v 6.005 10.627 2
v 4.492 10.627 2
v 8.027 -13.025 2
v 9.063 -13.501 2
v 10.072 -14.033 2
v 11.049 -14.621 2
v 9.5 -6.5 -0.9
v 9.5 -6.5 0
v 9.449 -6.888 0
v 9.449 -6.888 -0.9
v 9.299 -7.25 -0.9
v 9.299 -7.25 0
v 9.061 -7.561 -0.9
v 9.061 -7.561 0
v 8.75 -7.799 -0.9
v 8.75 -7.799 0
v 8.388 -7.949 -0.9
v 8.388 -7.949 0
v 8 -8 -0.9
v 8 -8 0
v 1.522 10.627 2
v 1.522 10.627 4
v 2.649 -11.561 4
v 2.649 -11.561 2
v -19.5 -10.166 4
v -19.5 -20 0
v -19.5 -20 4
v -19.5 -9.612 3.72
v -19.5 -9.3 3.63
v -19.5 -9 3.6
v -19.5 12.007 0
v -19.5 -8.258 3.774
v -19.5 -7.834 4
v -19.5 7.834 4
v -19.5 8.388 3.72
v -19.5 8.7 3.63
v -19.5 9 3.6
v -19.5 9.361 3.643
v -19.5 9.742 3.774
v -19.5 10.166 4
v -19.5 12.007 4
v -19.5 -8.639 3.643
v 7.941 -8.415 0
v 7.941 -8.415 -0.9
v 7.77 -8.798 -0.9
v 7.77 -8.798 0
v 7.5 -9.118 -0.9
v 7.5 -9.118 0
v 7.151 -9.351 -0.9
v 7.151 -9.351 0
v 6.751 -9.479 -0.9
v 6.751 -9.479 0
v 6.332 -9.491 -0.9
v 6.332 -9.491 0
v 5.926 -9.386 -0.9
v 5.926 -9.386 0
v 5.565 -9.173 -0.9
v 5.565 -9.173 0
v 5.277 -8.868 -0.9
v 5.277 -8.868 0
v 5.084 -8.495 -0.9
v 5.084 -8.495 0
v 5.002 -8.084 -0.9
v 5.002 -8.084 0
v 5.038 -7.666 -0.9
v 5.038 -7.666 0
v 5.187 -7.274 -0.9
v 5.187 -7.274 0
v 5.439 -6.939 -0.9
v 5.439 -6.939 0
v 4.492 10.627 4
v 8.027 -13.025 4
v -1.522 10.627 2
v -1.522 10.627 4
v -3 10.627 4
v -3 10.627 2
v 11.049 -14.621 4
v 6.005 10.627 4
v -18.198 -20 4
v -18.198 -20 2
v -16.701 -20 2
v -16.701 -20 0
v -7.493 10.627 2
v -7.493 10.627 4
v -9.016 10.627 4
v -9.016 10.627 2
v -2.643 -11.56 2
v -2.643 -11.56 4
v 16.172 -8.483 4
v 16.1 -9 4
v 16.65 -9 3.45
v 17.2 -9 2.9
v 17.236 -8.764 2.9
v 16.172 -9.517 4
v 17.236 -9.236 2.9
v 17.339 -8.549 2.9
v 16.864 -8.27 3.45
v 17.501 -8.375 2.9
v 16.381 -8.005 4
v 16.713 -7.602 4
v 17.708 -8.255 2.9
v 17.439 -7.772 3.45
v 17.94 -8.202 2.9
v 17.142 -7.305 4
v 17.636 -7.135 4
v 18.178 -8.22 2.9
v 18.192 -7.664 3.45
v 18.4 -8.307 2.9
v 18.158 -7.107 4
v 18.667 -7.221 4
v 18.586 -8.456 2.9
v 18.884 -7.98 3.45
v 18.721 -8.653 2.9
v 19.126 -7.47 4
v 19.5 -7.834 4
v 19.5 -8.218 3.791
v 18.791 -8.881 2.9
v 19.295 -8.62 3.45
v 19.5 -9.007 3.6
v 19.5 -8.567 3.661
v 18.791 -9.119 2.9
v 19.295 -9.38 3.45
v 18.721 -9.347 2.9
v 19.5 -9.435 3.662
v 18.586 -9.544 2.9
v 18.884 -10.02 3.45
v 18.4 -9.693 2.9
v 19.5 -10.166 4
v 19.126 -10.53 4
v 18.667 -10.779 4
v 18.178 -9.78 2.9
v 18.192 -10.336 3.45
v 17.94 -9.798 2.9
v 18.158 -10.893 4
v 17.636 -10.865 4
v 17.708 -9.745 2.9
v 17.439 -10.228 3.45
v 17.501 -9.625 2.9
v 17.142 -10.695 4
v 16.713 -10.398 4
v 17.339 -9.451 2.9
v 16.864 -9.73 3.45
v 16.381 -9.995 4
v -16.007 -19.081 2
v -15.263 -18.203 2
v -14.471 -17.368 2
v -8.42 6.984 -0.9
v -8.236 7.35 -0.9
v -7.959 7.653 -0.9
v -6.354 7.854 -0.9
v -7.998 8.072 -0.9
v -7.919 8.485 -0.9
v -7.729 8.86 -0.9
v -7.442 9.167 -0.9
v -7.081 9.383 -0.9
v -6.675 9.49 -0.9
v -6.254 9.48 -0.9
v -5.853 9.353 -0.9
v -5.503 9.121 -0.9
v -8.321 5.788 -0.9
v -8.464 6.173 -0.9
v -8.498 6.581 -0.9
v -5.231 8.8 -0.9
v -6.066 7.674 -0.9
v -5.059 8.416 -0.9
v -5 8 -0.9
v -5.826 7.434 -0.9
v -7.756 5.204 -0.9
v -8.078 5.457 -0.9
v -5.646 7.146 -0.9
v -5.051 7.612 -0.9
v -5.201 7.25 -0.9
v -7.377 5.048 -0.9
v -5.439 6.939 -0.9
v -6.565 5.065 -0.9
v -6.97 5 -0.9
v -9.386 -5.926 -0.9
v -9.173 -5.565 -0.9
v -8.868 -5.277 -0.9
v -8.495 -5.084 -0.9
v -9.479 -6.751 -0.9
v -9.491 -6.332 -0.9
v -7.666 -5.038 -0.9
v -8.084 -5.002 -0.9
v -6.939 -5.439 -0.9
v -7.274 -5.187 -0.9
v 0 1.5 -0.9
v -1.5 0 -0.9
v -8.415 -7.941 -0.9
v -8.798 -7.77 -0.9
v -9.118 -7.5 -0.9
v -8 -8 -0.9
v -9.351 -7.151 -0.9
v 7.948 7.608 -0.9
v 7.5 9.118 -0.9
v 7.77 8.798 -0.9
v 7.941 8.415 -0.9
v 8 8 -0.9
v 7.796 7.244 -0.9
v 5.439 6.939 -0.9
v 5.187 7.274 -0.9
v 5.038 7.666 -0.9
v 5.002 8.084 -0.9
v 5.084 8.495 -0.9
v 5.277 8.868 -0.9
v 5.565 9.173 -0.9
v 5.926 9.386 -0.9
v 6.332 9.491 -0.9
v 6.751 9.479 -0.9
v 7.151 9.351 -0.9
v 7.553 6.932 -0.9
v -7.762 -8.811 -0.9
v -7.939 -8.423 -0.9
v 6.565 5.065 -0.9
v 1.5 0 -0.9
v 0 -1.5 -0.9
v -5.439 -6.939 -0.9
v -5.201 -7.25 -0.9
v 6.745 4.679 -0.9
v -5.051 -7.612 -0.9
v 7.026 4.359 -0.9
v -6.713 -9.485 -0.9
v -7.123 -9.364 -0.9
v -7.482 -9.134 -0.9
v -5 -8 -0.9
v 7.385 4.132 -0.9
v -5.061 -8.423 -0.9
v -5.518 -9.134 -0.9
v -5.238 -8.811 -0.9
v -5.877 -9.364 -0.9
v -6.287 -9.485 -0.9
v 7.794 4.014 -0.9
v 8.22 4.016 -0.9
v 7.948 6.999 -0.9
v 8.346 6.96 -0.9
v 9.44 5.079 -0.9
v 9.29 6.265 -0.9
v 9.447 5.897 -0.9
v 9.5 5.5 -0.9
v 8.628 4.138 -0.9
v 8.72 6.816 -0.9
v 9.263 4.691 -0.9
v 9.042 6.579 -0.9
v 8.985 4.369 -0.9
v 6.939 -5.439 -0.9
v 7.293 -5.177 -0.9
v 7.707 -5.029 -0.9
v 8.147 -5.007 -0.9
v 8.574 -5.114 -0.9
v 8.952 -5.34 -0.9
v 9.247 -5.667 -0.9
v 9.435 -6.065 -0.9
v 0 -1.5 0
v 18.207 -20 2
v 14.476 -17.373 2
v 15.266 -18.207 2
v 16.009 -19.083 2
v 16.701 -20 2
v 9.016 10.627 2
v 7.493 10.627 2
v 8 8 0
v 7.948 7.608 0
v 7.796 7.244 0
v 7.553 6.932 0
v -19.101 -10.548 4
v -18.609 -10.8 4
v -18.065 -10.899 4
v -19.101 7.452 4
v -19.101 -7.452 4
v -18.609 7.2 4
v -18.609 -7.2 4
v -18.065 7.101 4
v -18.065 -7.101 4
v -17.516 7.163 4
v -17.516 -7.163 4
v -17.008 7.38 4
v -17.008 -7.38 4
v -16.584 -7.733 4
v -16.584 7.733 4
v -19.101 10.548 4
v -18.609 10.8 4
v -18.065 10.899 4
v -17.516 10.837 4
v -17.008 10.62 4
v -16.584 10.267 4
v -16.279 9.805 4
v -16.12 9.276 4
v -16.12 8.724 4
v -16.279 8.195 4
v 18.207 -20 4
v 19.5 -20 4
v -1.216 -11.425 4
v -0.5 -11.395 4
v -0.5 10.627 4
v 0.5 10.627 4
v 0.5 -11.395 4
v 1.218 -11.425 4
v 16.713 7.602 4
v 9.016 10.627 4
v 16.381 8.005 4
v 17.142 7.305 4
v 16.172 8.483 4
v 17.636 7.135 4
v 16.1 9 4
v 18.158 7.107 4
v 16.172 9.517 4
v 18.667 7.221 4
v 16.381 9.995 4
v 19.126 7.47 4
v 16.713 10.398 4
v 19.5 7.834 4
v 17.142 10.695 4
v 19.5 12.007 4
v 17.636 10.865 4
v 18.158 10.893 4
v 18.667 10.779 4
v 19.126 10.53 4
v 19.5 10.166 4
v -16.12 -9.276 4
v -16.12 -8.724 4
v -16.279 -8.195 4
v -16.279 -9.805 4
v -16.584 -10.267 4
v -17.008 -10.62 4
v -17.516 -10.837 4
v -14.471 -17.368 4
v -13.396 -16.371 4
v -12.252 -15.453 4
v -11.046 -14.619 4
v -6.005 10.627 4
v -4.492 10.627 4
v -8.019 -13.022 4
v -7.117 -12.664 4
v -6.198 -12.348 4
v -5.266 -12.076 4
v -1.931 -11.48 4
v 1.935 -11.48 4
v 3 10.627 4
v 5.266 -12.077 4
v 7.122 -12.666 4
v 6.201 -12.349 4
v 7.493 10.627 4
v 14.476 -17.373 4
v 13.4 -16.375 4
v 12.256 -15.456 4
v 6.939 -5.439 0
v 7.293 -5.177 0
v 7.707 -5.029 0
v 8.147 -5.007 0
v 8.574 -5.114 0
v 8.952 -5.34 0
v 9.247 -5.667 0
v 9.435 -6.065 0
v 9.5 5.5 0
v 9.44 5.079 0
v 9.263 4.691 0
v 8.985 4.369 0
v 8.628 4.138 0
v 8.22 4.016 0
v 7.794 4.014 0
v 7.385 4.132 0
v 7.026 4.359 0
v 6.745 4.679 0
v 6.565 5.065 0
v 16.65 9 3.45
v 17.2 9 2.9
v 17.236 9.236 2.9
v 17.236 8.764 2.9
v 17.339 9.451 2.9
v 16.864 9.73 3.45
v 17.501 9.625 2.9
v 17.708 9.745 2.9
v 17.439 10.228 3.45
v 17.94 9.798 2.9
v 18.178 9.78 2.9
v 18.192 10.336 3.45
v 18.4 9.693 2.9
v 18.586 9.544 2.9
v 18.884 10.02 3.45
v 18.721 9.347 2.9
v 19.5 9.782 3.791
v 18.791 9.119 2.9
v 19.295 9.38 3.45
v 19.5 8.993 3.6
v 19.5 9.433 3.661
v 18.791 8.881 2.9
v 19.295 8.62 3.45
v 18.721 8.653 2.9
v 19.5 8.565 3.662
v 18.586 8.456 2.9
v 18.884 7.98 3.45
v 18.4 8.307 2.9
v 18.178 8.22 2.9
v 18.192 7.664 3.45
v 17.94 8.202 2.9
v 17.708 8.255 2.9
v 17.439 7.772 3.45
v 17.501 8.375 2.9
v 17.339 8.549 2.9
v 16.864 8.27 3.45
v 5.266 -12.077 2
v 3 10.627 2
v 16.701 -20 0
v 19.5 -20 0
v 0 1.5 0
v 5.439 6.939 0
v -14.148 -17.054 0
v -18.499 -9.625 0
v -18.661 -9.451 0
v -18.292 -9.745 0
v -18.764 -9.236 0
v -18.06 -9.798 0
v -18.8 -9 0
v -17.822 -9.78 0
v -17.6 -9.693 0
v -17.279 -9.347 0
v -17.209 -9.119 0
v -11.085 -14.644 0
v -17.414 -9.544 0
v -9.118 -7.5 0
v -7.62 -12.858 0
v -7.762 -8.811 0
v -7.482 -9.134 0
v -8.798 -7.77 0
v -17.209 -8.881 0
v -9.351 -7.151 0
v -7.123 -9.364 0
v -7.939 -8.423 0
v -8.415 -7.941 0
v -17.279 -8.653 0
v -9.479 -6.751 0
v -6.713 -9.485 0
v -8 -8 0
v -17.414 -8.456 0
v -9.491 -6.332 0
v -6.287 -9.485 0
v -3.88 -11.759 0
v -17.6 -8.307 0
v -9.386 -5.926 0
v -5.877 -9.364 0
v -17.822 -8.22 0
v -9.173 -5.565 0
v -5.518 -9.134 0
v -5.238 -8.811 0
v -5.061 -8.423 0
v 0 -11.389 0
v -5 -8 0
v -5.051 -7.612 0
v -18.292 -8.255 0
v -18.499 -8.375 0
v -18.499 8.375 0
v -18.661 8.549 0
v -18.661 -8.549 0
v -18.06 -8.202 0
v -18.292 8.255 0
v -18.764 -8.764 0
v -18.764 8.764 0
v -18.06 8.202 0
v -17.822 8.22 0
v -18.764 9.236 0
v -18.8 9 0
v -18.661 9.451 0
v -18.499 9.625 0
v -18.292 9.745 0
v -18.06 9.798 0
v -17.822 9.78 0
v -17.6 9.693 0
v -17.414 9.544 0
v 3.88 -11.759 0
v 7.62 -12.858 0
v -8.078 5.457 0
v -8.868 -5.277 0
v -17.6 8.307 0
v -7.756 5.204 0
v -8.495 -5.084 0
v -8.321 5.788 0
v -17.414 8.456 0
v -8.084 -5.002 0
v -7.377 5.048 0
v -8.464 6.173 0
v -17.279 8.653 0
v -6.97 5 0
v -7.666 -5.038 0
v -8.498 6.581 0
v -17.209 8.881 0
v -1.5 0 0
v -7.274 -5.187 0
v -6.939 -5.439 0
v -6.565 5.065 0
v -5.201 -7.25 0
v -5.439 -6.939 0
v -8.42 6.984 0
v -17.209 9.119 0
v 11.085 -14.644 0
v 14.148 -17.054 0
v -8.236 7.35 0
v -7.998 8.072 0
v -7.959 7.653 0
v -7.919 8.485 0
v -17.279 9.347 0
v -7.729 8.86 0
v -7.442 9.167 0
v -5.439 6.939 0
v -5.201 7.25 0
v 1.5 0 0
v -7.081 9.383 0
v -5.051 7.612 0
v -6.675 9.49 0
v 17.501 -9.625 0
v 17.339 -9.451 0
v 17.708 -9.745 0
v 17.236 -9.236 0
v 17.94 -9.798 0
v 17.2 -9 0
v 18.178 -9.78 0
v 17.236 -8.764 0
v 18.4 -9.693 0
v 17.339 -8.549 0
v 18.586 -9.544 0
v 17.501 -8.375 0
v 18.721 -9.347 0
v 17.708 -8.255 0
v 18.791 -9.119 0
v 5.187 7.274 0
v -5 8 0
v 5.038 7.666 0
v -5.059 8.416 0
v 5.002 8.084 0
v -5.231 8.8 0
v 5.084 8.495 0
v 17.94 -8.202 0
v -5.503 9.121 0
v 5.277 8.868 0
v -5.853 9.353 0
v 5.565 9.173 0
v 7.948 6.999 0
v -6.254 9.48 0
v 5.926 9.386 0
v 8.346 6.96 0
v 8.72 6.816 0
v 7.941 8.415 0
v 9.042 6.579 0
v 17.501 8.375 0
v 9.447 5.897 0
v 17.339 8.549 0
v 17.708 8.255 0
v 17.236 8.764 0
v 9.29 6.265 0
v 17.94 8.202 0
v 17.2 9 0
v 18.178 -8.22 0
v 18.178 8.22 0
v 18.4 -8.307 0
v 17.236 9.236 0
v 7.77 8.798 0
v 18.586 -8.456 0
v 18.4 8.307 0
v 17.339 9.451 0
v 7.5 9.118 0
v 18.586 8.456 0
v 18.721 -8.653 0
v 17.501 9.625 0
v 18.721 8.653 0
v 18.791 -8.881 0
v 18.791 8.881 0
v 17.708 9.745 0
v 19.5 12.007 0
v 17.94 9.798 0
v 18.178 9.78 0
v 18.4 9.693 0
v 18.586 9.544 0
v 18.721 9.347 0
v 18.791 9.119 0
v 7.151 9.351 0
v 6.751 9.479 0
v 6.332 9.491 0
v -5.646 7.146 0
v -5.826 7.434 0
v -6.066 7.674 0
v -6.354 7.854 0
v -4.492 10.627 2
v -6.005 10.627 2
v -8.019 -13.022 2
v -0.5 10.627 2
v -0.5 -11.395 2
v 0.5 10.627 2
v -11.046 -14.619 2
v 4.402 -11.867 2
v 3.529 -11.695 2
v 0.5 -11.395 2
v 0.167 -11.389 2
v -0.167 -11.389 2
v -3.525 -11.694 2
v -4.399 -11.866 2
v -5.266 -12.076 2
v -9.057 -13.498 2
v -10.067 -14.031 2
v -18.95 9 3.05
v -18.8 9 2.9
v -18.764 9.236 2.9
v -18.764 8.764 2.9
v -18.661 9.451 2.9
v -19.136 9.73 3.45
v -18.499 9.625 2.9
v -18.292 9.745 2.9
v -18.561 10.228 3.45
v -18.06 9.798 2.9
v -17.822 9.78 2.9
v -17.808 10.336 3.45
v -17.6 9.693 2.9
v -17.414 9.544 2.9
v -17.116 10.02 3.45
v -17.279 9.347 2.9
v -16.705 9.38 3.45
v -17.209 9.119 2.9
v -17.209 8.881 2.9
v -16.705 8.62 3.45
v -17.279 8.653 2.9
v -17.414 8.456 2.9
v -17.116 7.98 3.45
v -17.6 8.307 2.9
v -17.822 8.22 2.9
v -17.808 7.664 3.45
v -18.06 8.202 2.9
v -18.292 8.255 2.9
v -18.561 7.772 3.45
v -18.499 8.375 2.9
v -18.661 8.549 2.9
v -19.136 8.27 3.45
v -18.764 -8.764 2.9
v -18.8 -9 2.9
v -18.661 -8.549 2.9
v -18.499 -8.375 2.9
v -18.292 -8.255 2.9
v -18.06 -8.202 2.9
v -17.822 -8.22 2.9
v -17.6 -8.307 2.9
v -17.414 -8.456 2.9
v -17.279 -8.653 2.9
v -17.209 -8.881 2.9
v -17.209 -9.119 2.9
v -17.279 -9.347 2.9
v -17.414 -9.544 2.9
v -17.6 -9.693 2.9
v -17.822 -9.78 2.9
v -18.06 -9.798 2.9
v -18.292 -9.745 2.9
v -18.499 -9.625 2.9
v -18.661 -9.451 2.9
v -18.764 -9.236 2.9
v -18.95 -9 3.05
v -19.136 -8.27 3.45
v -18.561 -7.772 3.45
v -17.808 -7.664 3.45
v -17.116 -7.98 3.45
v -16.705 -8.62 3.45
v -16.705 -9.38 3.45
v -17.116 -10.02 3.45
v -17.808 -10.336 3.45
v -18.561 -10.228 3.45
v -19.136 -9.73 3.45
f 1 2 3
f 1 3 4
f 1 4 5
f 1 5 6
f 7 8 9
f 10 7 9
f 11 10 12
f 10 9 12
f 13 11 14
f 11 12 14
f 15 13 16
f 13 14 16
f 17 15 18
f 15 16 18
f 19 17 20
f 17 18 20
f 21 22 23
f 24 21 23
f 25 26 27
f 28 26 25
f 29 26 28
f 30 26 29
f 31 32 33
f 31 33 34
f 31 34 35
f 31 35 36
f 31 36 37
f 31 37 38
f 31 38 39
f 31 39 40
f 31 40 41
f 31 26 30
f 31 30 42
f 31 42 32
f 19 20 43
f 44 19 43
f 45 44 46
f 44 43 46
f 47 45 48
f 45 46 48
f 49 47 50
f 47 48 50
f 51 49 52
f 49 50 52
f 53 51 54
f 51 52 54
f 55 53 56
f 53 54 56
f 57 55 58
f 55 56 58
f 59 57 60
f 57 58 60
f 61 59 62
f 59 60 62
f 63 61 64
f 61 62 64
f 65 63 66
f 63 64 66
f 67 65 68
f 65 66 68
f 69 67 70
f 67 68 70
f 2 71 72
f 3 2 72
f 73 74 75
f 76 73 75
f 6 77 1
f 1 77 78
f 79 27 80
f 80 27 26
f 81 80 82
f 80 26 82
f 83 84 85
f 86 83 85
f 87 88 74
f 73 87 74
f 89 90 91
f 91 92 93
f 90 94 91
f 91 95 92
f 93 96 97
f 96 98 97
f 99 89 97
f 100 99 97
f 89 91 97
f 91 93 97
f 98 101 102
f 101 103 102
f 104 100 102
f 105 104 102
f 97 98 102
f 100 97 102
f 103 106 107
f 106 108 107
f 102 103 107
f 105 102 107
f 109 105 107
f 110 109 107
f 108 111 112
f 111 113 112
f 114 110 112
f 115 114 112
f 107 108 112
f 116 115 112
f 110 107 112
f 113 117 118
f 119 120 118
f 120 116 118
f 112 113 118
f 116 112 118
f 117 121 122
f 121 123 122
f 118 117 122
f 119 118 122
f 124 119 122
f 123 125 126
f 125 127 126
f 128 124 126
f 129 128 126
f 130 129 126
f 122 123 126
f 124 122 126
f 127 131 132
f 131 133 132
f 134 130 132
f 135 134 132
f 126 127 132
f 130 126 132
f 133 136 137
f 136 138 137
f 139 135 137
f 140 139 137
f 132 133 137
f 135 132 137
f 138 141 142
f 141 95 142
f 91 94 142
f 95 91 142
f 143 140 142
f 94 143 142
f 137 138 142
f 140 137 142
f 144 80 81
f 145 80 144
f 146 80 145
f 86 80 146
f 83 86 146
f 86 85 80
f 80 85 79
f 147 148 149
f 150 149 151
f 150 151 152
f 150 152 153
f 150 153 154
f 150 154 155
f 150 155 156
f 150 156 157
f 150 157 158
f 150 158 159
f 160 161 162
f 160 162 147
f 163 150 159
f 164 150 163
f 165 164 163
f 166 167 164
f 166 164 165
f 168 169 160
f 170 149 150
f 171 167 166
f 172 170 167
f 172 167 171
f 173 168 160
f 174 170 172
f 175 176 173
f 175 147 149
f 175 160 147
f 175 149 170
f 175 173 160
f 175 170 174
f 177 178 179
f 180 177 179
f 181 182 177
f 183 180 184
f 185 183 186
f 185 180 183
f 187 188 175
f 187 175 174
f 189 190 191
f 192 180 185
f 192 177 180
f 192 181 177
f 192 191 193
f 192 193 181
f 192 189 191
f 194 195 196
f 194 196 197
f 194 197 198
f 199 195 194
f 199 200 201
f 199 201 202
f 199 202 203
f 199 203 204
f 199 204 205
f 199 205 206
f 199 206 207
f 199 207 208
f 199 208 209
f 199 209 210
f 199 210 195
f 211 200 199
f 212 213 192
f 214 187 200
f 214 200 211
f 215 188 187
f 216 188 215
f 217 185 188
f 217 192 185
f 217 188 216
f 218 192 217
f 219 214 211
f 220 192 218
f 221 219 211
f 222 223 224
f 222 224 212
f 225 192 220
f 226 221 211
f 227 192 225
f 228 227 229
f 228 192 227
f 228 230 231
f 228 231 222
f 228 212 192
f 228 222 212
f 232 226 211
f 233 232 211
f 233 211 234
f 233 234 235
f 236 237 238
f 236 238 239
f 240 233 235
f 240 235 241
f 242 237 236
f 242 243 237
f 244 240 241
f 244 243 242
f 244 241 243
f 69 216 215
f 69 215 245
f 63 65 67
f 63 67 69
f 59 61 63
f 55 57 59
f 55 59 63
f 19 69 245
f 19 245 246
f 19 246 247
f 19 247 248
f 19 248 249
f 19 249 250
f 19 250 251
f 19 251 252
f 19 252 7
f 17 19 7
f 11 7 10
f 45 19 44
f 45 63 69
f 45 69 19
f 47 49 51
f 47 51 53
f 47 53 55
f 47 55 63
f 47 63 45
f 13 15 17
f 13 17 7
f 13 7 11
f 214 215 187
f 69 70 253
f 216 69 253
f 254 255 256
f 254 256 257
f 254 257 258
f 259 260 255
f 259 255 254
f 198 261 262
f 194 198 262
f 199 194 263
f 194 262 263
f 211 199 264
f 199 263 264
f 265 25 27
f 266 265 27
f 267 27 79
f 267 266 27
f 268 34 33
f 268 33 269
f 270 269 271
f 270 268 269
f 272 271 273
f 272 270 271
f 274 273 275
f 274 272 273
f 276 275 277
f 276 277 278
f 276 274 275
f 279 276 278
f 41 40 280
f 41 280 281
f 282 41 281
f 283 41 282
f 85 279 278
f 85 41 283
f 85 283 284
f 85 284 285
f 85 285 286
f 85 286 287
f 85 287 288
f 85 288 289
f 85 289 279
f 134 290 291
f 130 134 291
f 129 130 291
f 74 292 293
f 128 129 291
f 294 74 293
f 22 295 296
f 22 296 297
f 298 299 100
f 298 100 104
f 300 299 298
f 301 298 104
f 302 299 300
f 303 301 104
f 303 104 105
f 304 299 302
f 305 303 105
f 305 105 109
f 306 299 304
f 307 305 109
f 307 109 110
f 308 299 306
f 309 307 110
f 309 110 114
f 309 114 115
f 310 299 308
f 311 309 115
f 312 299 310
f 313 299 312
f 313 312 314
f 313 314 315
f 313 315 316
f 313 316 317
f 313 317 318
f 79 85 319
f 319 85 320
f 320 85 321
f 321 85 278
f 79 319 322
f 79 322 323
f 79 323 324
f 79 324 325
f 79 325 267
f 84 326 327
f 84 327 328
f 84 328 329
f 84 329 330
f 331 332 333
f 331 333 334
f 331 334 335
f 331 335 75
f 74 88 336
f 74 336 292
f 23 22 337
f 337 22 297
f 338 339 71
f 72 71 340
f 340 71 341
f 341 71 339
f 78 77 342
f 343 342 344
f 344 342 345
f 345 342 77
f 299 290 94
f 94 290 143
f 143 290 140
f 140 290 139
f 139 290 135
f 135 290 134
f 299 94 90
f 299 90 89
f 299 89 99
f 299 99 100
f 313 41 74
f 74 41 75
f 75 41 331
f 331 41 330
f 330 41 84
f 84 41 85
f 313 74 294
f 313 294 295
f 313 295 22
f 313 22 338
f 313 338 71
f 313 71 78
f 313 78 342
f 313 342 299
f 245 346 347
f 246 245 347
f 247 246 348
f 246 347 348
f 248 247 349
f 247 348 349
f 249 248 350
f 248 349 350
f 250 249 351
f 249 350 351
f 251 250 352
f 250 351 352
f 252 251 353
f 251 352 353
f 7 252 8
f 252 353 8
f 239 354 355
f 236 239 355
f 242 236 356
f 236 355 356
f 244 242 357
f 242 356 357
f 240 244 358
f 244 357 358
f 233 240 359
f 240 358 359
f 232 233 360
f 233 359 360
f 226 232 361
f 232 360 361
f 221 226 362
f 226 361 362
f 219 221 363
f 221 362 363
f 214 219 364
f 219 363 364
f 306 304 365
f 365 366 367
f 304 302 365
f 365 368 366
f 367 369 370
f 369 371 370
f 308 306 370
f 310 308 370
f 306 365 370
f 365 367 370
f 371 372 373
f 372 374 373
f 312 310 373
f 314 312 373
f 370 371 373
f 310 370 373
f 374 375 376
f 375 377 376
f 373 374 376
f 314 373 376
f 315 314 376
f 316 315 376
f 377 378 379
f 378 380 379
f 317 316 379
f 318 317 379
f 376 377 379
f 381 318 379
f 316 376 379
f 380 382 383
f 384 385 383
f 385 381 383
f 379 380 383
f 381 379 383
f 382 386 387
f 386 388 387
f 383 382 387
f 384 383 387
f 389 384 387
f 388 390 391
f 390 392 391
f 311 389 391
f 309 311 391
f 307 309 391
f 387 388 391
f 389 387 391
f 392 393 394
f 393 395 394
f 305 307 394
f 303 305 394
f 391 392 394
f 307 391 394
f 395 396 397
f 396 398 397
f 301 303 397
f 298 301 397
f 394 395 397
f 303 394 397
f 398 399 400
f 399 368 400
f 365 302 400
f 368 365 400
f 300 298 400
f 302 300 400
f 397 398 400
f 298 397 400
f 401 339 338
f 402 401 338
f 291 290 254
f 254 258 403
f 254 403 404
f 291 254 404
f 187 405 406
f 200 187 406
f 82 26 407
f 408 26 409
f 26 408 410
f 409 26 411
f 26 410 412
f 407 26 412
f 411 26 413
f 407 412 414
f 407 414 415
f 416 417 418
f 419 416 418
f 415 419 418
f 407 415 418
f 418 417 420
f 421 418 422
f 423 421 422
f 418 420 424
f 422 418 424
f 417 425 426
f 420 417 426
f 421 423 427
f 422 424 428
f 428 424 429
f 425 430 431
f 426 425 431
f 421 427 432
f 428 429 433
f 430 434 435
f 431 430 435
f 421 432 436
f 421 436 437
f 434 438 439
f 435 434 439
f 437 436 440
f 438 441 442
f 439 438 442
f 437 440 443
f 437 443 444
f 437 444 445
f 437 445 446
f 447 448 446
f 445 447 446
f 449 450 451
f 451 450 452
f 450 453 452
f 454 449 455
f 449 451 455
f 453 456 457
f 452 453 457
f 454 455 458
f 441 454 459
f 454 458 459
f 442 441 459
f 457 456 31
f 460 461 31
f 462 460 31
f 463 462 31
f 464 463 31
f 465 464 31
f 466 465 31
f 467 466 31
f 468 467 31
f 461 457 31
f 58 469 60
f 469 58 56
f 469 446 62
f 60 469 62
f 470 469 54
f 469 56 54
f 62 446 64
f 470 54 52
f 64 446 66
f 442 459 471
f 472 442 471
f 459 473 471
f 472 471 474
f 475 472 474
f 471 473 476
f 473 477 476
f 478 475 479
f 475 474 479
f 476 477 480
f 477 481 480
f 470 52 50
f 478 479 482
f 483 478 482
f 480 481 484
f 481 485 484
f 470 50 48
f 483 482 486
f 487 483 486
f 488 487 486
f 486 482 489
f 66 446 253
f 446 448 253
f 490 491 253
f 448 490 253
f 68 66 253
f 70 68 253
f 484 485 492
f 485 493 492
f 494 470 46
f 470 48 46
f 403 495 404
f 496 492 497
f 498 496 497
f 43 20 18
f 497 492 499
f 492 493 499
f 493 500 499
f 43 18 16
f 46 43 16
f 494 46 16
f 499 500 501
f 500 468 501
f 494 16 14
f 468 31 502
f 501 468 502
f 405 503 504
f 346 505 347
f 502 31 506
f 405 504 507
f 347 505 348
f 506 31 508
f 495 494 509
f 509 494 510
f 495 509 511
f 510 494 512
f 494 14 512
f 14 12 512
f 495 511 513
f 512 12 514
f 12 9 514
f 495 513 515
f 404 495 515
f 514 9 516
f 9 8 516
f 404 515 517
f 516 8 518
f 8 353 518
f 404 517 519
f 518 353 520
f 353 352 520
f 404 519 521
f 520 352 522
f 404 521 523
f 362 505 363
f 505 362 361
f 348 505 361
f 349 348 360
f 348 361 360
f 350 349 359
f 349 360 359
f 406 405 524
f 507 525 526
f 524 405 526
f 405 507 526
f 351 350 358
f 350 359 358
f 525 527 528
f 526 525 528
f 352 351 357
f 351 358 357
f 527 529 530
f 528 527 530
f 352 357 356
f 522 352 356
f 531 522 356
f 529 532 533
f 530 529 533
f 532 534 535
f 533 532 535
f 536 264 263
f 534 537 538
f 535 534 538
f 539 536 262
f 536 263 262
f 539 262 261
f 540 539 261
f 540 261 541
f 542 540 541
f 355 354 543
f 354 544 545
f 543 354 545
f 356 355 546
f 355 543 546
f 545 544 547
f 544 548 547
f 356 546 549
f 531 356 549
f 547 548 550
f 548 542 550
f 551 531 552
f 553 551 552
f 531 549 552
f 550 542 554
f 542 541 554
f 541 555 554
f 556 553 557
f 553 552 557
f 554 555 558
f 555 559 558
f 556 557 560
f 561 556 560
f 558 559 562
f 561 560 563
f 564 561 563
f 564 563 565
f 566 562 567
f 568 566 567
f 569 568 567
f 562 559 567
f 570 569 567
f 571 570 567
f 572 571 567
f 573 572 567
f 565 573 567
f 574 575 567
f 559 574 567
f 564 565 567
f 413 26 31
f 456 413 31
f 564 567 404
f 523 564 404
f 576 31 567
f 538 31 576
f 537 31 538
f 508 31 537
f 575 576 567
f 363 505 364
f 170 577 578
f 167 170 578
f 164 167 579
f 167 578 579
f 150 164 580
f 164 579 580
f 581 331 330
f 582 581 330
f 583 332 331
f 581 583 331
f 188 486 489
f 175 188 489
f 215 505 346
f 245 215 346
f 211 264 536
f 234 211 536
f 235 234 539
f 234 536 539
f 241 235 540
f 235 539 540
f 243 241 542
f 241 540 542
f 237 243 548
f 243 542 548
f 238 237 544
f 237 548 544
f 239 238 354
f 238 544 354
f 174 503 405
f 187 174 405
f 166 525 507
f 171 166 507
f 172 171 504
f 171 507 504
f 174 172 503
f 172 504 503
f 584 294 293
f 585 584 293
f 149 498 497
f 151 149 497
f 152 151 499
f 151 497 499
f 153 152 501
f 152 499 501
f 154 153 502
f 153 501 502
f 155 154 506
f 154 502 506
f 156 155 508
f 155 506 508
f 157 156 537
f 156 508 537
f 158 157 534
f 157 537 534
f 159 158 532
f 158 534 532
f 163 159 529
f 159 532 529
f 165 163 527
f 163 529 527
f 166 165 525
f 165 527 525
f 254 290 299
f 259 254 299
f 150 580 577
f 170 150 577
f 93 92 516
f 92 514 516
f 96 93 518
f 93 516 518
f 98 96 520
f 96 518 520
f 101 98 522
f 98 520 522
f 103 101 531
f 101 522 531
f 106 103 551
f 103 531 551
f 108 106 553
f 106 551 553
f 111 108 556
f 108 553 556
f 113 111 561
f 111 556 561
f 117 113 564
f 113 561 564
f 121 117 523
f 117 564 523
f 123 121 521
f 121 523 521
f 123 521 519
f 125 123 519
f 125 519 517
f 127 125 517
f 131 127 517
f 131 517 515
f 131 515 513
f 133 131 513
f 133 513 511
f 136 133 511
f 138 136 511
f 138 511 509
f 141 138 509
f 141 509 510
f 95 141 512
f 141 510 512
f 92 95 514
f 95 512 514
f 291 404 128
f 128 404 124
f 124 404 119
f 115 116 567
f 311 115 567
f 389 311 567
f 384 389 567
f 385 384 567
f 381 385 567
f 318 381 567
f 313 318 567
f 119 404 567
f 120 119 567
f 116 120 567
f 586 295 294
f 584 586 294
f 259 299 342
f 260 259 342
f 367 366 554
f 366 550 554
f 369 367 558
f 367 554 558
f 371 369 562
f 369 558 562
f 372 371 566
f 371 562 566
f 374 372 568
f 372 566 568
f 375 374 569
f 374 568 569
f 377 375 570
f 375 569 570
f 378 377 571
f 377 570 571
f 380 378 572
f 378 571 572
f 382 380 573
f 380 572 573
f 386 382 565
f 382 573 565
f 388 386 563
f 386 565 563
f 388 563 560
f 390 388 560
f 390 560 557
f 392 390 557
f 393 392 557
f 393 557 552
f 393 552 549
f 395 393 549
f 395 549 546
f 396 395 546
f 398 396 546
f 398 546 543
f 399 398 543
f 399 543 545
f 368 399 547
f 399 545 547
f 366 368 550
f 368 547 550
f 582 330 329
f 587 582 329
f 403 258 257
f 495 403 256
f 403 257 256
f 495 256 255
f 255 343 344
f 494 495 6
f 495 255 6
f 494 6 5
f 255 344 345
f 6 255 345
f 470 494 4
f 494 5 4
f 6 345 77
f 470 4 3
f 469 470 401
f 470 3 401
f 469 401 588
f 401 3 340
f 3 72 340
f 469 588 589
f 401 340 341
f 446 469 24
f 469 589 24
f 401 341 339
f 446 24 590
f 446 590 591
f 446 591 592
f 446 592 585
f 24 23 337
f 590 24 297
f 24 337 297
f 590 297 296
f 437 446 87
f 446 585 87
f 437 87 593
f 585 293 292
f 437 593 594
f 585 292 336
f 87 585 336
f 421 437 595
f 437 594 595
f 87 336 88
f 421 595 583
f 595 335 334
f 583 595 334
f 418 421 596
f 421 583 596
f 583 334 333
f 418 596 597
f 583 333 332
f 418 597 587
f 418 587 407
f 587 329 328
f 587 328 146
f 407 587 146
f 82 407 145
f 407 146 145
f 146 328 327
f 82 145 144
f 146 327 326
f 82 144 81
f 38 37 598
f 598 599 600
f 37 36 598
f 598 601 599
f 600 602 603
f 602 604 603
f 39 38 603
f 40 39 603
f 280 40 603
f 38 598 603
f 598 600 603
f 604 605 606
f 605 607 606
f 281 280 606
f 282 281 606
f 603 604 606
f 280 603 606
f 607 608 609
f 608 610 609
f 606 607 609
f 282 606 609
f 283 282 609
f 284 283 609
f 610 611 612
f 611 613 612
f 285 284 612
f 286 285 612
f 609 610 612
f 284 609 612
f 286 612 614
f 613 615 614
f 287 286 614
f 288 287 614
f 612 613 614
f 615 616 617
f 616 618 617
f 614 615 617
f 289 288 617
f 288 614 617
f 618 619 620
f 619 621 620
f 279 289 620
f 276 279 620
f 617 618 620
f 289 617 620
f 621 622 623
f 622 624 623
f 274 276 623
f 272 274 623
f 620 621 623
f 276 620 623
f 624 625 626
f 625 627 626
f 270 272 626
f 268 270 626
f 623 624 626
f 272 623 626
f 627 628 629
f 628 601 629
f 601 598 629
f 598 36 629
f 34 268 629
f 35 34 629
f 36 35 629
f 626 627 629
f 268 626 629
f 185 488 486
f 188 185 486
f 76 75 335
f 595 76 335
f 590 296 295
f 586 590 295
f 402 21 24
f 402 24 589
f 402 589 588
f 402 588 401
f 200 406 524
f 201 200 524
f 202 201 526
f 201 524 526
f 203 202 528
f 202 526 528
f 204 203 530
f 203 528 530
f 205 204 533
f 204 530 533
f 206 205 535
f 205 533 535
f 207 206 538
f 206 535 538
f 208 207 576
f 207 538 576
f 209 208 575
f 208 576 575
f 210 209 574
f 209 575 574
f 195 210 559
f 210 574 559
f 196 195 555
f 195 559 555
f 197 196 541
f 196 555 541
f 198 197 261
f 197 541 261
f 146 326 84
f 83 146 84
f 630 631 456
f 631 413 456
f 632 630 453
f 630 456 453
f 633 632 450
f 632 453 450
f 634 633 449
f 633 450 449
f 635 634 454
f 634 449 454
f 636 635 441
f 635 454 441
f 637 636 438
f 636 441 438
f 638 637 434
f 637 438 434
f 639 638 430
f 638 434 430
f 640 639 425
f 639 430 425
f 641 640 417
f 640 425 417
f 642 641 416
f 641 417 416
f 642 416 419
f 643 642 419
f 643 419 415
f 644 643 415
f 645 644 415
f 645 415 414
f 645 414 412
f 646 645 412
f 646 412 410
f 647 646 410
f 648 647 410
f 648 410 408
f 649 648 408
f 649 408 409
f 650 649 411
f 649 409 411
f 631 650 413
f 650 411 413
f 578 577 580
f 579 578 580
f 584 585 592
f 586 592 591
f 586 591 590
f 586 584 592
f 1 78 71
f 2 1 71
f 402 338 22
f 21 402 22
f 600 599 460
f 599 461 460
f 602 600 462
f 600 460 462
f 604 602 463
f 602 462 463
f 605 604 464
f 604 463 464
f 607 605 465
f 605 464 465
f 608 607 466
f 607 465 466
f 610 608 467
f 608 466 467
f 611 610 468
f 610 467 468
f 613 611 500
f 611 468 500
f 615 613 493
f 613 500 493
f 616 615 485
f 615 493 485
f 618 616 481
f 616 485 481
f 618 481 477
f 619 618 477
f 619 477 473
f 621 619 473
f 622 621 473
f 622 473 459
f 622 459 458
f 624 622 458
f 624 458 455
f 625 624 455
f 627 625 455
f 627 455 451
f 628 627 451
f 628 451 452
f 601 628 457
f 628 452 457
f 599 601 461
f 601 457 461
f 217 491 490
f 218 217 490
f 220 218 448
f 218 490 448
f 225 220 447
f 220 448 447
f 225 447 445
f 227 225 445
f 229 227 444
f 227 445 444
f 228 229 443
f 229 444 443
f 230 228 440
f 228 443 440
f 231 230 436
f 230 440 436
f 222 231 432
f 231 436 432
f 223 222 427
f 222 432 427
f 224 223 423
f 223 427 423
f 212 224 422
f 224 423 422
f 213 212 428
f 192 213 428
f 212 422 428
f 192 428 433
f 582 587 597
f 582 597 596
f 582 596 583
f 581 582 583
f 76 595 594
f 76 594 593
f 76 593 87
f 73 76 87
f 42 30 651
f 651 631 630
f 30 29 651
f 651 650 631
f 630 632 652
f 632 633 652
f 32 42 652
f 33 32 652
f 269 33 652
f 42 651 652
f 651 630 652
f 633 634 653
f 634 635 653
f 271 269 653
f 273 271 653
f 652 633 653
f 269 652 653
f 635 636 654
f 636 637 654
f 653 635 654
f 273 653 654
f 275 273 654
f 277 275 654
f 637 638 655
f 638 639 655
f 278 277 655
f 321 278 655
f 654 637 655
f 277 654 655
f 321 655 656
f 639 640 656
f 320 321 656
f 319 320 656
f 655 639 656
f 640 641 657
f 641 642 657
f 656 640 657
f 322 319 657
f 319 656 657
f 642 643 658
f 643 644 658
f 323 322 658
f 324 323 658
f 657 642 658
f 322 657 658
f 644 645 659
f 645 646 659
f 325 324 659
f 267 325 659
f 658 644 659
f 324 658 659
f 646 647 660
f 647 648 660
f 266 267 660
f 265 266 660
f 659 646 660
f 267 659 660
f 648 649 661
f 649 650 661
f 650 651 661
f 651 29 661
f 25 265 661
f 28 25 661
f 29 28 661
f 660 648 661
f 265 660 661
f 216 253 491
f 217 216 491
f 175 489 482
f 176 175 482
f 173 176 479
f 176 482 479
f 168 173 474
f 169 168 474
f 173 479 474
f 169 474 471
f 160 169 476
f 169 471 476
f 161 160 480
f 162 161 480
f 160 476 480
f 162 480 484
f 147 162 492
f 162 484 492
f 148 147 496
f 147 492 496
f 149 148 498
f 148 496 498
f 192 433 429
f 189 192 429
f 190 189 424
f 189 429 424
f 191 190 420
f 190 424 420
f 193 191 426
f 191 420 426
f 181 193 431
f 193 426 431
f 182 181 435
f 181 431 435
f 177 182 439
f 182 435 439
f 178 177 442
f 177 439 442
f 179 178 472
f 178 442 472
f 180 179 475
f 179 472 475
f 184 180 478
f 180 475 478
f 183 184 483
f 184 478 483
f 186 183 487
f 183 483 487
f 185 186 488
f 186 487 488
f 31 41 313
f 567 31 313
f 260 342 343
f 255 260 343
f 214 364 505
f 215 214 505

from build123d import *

# Parameters (mm, degrees)
F0_W           = 39
F0_H           = 40
F1_DEPTH       = 4
F4_DEPTH       = 25
F5_W           = 39
F5_H           = 7.9928017035
F6_DEPTH       = 25
F9_D           = 1.6
F9_CSINK_D     = 3.8
F9_CSINK_ANGLE = 90
F10_DEPTH      = 2
F12_DEPTH      = 0.9
F13_DEPTH      = 2


with BuildPart() as f1:
    # F0 (on Top) → F1 (new body)
    with BuildSketch(Plane.XY):
        Rectangle(F0_W, F0_H)
    extrude(amount=F1_DEPTH)

    # F3 (on face) → F4 (cut)
    with BuildSketch(Plane.XY.offset(4)):
        with BuildLine():
            Line((-16.7006288041, -20), (16.7006288041, -20))
            ThreePointArc((16.7006288041, -20), (0, -11.3886078894), (-16.7006288041, -20))
        make_face()
        with BuildLine():
            ThreePointArc((-16.7006288041, -20), (-6.2404771258, -51.4156774402), (20.5, -31.8886078894))
            ThreePointArc((20.5, -31.8886078894), (19.5270695508, -25.6481307636), (16.7006288041, -20))
            Line((16.7006288041, -20), (-16.7006288041, -20))
        make_face()
    extrude(amount=-F4_DEPTH, mode=Mode.SUBTRACT)

    # F5 (on face) → F6 (cut)
    with BuildSketch(Plane.XY.offset(4)):
        with Locations((0, 16.0035991482)):
            Rectangle(F5_W, F5_H)
    extrude(amount=-F6_DEPTH, mode=Mode.SUBTRACT)

    # F9 (through all)
    with Locations(Plane.XY.offset(4)):
        with Locations((18, 9), (18, -9), (-18, 9), (-18, -9)):
            CounterSinkHole(F9_D / 2, F9_CSINK_D / 2, counter_sink_angle=F9_CSINK_ANGLE)

    # F7 (on face) → F10 (cut)
    with BuildSketch(Plane.XY.offset(4)):
        with BuildLine():
            Line((0.5, 10.6266411021), (-0.5, 10.6266411021))
            Line((-0.5, 10.6266411021), (-0.5, -11.3947063575))
            ThreePointArc((-0.5, -11.3947063575), (0, -11.3886078894), (0.5, -11.3947063575))
            Line((0.5, -11.3947063575), (0.5, 10.6266411021))
        make_face()
        with BuildLine():
            ThreePointArc((-5.2656999319, -12.0764297096), (-3.9629214288, -11.7752975267), (-2.6432830651, -11.5597354505))
            Line((-2.6432830651, -11.5597354505), (-1.522443646, 10.6266411021))
            Line((-1.522443646, 10.6266411021), (-2.021334134, 10.6266411021))
            Line((-2.021334134, 10.6266411021), (-2.4928057101, 10.6266411021))
            Line((-2.4928057101, 10.6266411021), (-2.9997361505, 10.6266411021))
            Line((-2.9997361505, 10.6266411021), (-5.2656999319, -12.0764297096))
        make_face()
        with BuildLine():
            ThreePointArc((-11.0458529252, -14.6190064709), (-9.5659756043, -13.7573610835), (-8.0193476987, -13.0222340331))
            Line((-8.0193476987, -13.0222340331), (-4.491522759, 10.6266411021))
            Line((-4.491522759, 10.6266411021), (-4.9930326641, 10.6266411021))
            Line((-4.9930326641, 10.6266411021), (-5.5073648691, 10.6266411021))
            Line((-5.5073648691, 10.6266411021), (-6.005277995, 10.6266411021))
            Line((-6.005277995, 10.6266411021), (-11.0458529252, -14.6190064709))
        make_face()
        with BuildLine():
            ThreePointArc((-16.7006288041, -20), (-15.6412505167, -18.6371444882), (-14.4709725994, -17.3682445321))
            Line((-14.4709725994, -17.3682445321), (-7.4931742786, 10.6266411021))
            Line((-7.4931742786, 10.6266411021), (-7.993305102, 10.6266411021))
            Line((-7.993305102, 10.6266411021), (-8.507637307, 10.6266411021))
            Line((-8.507637307, 10.6266411021), (-9.0164762619, 10.6266411021))
            Line((-9.0164762619, 10.6266411021), (-18.1983038783, -20))
            Line((-18.1983038783, -20), (-17.6982320845, -20))
            Line((-17.6982320845, -20), (-16.7006288041, -20))
        make_face()
    extrude(amount=-F10_DEPTH, mode=Mode.SUBTRACT)

    # F11 (on face) → F12 (join)
    with BuildSketch(Plane(origin=(0, 0, 0), x_dir=(1, 0, 0), z_dir=(0, 0, -1))):
        with BuildLine():
            Line((1.5, 0), (6.9393398282, 5.4393398282))
            ThreePointArc((6.9393398282, 5.4393398282), (6.6141807012, 5.9259748515), (6.5, 6.5))
            ThreePointArc((6.5, 6.5), (5.9259748515, 6.6141807012), (5.4393398282, 6.9393398282))
            Line((5.4393398282, 6.9393398282), (0, 1.5))
            Line((0, 1.5), (1.5, 0))
        make_face()
        with BuildLine():
            ThreePointArc((6.5, 6.5), (6.6141807012, 5.9259748515), (6.9393398282, 5.4393398282))
            ThreePointArc((6.9393398282, 5.4393398282), (8.5740251485, 5.1141807012), (9.5, 6.5))
            ThreePointArc((9.5, 6.5), (9.0606601718, 7.5606601718), (8, 8))
            ThreePointArc((8, 8), (7.5606601718, 6.9393398282), (6.5, 6.5))
        make_face()
        with BuildLine():
            Line((6.5645856533, -5.0645856533), (1.5, 0))
            Line((1.5, 0), (0, -1.5))
            Line((0, -1.5), (5.4393398282, -6.9393398282))
            ThreePointArc((5.4393398282, -6.9393398282), (6.1413193654, -6.5435151211), (6.9468304687, -6.5680982812))
            ThreePointArc((6.9468304687, -6.5680982812), (6.5462462433, -5.8695943925), (6.5645856533, -5.0645856533))
        make_face()
        Polygon((0, -1.5), (1.5, 0), (0, 1.5), (-1.5, 0), align=None)
        with BuildLine():
            ThreePointArc((5.4393398282, 6.9393398282), (5.9259748515, 6.6141807012), (6.5, 6.5))
            ThreePointArc((6.5, 6.5), (6.9393398282, 7.5606601718), (8, 8))
            ThreePointArc((8, 8), (5.9259748515, 9.3858192988), (5.4393398282, 6.9393398282))
        make_face()
        with BuildLine():
            ThreePointArc((8, 8), (6.9393398282, 7.5606601718), (6.5, 6.5))
            ThreePointArc((6.5, 6.5), (7.5606601718, 6.9393398282), (8, 8))
        make_face()
        with BuildLine():
            Line((-5.4393398282, -6.9393398282), (0, -1.5))
            Line((0, -1.5), (-1.5, 0))
            Line((-1.5, 0), (-6.5645856533, -5.0645856533))
            ThreePointArc((-6.5645856533, -5.0645856533), (-5.7951926461, -5.6064457263), (-5.5, -6.5))
            ThreePointArc((-5.5, -6.5), (-5.5102000145, -6.6746310491), (-5.5406613378, -6.8468871126))
            ThreePointArc((-5.5406613378, -6.8468871126), (-5.4889432763, -6.8919547385), (-5.4393398282, -6.9393398282))
        make_face()
        with BuildLine():
            ThreePointArc((9.5, -5.5), (8.2200891637, -4.0162342638), (6.5645856533, -5.0645856533))
            ThreePointArc((6.5645856533, -5.0645856533), (6.5462462433, -5.8695943925), (6.9468304687, -6.5680982812))
            ThreePointArc((6.9468304687, -6.5680982812), (7.2717436331, -6.7137606114), (7.5531695313, -6.9319017188))
            ThreePointArc((7.5531695313, -6.9319017188), (8.8887503297, -6.7083554326), (9.5, -5.5))
        make_face()
        with BuildLine():
            Line((-1.5, 0), (0, 1.5))
            Line((0, 1.5), (-5.4393398282, 6.9393398282))
            ThreePointArc((-5.4393398282, 6.9393398282), (-5.9259748515, 6.6141807012), (-6.5, 6.5))
            ThreePointArc((-6.5, 6.5), (-6.6141807012, 5.9259748515), (-6.9393398282, 5.4393398282))
            Line((-6.9393398282, 5.4393398282), (-1.5, 0))
        make_face()
        with BuildLine():
            ThreePointArc((-5, -8), (-5.1141807012, -7.4259748515), (-5.4393398282, -6.9393398282))
            Line((-5.4393398282, -6.9393398282), (-5.6464466094, -7.1464466094))
            ThreePointArc((-5.6464466094, -7.1464466094), (-5.9393398282, -7.5606601718), (-6.3535533906, -7.8535533906))
            ThreePointArc((-6.3535533906, -7.8535533906), (-7.185794128, -7.9884490391), (-7.9593386622, -7.6531128874))
            ThreePointArc((-7.9593386622, -7.6531128874), (-6.6746310491, -9.4897999855), (-5, -8))
        make_face()
        with BuildLine():
            Line((-5.6464466094, -7.1464466094), (-5.4393398282, -6.9393398282))
            ThreePointArc((-5.4393398282, -6.9393398282), (-5.4889432763, -6.8919547385), (-5.5406613378, -6.8468871126))
            ThreePointArc((-5.5406613378, -6.8468871126), (-5.585601047, -6.9994753265), (-5.6464466094, -7.1464466094))
        make_face()
        with BuildLine():
            ThreePointArc((6.9468304687, -6.5680982812), (6.1413193654, -6.5435151211), (5.4393398282, -6.9393398282))
            ThreePointArc((5.4393398282, -6.9393398282), (5.9259748515, -9.3858192988), (8, -8))
            ThreePointArc((8, -8), (7.8837908615, -7.421102037), (7.5531695313, -6.9319017188))
            ThreePointArc((7.5531695313, -6.9319017188), (7.2282563669, -6.7862393886), (6.9468304687, -6.5680982812))
        make_face()
        with BuildLine():
            ThreePointArc((7.5531695313, -6.9319017188), (7.2717436331, -6.7137606114), (6.9468304687, -6.5680982812))
            ThreePointArc((6.9468304687, -6.5680982812), (7.2282563669, -6.7862393886), (7.5531695313, -6.9319017188))
        make_face()
        with BuildLine():
            ThreePointArc((-6.5, 6.5), (-5.9259748515, 6.6141807012), (-5.4393398282, 6.9393398282))
            ThreePointArc((-5.4393398282, 6.9393398282), (-5.1141807012, 7.4259748515), (-5, 8))
            ThreePointArc((-5, 8), (-6.5, 9.5), (-8, 8))
            ThreePointArc((-8, 8), (-6.9393398282, 7.5606601718), (-6.5, 6.5))
        make_face()
        with BuildLine():
            Line((-6.3535533906, -7.8535533906), (-5.6464466094, -7.1464466094))
            ThreePointArc((-5.6464466094, -7.1464466094), (-5.585601047, -6.9994753265), (-5.5406613378, -6.8468871126))
            ThreePointArc((-5.5406613378, -6.8468871126), (-6.974341649, -6.5769750529), (-7.9593386622, -7.6531128874))
            ThreePointArc((-7.9593386622, -7.6531128874), (-7.185794128, -7.9884490391), (-6.3535533906, -7.8535533906))
        make_face()
        with BuildLine():
            ThreePointArc((-7.9593386622, -7.6531128874), (-6.974341649, -6.5769750529), (-5.5406613378, -6.8468871126))
            ThreePointArc((-5.5406613378, -6.8468871126), (-5.5102000145, -6.6746310491), (-5.5, -6.5))
            ThreePointArc((-5.5, -6.5), (-5.7951926461, -5.6064457263), (-6.5645856533, -5.0645856533))
            ThreePointArc((-6.5645856533, -5.0645856533), (-8.3205084182, -5.7884822437), (-7.9593386622, -7.6531128874))
        make_face()
        with BuildLine():
            ThreePointArc((-8, 8), (-9.3858192988, 5.9259748515), (-6.9393398282, 5.4393398282))
            ThreePointArc((-6.9393398282, 5.4393398282), (-6.6141807012, 5.9259748515), (-6.5, 6.5))
            ThreePointArc((-6.5, 6.5), (-7.5606601718, 6.9393398282), (-8, 8))
        make_face()
        with BuildLine():
            ThreePointArc((-8, 8), (-7.5606601718, 6.9393398282), (-6.5, 6.5))
            ThreePointArc((-6.5, 6.5), (-6.9393398282, 7.5606601718), (-8, 8))
        make_face()
    extrude(amount=F12_DEPTH)

    # F7 (on face) → F13 (cut)
    with BuildSketch(Plane.XY.offset(4)):
        with BuildLine():
            Line((0.5, 10.6266411021), (-0.5, 10.6266411021))
            Line((-0.5, 10.6266411021), (-0.5, -11.3947063575))
            ThreePointArc((-0.5, -11.3947063575), (0, -11.3886078894), (0.5, -11.3947063575))
            Line((0.5, -11.3947063575), (0.5, 10.6266411021))
        make_face()
        with BuildLine():
            Line((1.522443646, 10.6266411021), (2.6491718308, -11.5605020108))
            ThreePointArc((2.6491718308, -11.5605020108), (3.9661171857, -11.7759274497), (5.2662566492, -12.0765776829))
            Line((5.2662566492, -12.0765776829), (2.9997361505, 10.6266411021))
            Line((2.9997361505, 10.6266411021), (2.498709131, 10.6266411021))
            Line((2.498709131, 10.6266411021), (2.0272377878, 10.6266411021))
            Line((2.0272377878, 10.6266411021), (1.522443646, 10.6266411021))
        make_face()
        with BuildLine():
            Line((4.491522759, 10.6266411021), (8.0269443273, -13.0254648648))
            ThreePointArc((8.0269443273, -13.0254648648), (9.5712306064, -13.7601345759), (11.048909782, -14.620962056))
            Line((11.048909782, -14.620962056), (6.005277995, 10.6266411021))
            Line((6.005277995, 10.6266411021), (5.4984204471, 10.6266411021))
            Line((5.4984204471, 10.6266411021), (4.9972091801, 10.6266411021))
            Line((4.9972091801, 10.6266411021), (4.491522759, 10.6266411021))
        make_face()
        with BuildLine():
            ThreePointArc((-16.7006288041, -20), (-15.6412505167, -18.6371444882), (-14.4709725994, -17.3682445321))
            Line((-14.4709725994, -17.3682445321), (-7.4931742786, 10.6266411021))
            Line((-7.4931742786, 10.6266411021), (-7.993305102, 10.6266411021))
            Line((-7.993305102, 10.6266411021), (-8.507637307, 10.6266411021))
            Line((-8.507637307, 10.6266411021), (-9.0164762619, 10.6266411021))
            Line((-9.0164762619, 10.6266411021), (-18.1983038783, -20))
            Line((-18.1983038783, -20), (-17.6982320845, -20))
            Line((-17.6982320845, -20), (-16.7006288041, -20))
        make_face()
        with BuildLine():
            Line((7.4931742786, 10.6266411021), (14.4761775715, -17.3734336598))
            ThreePointArc((14.4761775715, -17.3734336598), (15.6436257508, -18.6399485848), (16.7006288041, -20))
            Line((16.7006288041, -20), (17.7064798772, -20))
            Line((17.7064798772, -20), (18.2065498084, -20))
            Line((18.2065498084, -20), (9.0164762619, 10.6266411021))
            Line((9.0164762619, 10.6266411021), (8.5177253932, 10.6266411021))
            Line((8.5177253932, 10.6266411021), (7.9971281812, 10.6266411021))
            Line((7.9971281812, 10.6266411021), (7.4931742786, 10.6266411021))
        make_face()
    extrude(amount=-F13_DEPTH, mode=Mode.SUBTRACT)


solid = f1.part
